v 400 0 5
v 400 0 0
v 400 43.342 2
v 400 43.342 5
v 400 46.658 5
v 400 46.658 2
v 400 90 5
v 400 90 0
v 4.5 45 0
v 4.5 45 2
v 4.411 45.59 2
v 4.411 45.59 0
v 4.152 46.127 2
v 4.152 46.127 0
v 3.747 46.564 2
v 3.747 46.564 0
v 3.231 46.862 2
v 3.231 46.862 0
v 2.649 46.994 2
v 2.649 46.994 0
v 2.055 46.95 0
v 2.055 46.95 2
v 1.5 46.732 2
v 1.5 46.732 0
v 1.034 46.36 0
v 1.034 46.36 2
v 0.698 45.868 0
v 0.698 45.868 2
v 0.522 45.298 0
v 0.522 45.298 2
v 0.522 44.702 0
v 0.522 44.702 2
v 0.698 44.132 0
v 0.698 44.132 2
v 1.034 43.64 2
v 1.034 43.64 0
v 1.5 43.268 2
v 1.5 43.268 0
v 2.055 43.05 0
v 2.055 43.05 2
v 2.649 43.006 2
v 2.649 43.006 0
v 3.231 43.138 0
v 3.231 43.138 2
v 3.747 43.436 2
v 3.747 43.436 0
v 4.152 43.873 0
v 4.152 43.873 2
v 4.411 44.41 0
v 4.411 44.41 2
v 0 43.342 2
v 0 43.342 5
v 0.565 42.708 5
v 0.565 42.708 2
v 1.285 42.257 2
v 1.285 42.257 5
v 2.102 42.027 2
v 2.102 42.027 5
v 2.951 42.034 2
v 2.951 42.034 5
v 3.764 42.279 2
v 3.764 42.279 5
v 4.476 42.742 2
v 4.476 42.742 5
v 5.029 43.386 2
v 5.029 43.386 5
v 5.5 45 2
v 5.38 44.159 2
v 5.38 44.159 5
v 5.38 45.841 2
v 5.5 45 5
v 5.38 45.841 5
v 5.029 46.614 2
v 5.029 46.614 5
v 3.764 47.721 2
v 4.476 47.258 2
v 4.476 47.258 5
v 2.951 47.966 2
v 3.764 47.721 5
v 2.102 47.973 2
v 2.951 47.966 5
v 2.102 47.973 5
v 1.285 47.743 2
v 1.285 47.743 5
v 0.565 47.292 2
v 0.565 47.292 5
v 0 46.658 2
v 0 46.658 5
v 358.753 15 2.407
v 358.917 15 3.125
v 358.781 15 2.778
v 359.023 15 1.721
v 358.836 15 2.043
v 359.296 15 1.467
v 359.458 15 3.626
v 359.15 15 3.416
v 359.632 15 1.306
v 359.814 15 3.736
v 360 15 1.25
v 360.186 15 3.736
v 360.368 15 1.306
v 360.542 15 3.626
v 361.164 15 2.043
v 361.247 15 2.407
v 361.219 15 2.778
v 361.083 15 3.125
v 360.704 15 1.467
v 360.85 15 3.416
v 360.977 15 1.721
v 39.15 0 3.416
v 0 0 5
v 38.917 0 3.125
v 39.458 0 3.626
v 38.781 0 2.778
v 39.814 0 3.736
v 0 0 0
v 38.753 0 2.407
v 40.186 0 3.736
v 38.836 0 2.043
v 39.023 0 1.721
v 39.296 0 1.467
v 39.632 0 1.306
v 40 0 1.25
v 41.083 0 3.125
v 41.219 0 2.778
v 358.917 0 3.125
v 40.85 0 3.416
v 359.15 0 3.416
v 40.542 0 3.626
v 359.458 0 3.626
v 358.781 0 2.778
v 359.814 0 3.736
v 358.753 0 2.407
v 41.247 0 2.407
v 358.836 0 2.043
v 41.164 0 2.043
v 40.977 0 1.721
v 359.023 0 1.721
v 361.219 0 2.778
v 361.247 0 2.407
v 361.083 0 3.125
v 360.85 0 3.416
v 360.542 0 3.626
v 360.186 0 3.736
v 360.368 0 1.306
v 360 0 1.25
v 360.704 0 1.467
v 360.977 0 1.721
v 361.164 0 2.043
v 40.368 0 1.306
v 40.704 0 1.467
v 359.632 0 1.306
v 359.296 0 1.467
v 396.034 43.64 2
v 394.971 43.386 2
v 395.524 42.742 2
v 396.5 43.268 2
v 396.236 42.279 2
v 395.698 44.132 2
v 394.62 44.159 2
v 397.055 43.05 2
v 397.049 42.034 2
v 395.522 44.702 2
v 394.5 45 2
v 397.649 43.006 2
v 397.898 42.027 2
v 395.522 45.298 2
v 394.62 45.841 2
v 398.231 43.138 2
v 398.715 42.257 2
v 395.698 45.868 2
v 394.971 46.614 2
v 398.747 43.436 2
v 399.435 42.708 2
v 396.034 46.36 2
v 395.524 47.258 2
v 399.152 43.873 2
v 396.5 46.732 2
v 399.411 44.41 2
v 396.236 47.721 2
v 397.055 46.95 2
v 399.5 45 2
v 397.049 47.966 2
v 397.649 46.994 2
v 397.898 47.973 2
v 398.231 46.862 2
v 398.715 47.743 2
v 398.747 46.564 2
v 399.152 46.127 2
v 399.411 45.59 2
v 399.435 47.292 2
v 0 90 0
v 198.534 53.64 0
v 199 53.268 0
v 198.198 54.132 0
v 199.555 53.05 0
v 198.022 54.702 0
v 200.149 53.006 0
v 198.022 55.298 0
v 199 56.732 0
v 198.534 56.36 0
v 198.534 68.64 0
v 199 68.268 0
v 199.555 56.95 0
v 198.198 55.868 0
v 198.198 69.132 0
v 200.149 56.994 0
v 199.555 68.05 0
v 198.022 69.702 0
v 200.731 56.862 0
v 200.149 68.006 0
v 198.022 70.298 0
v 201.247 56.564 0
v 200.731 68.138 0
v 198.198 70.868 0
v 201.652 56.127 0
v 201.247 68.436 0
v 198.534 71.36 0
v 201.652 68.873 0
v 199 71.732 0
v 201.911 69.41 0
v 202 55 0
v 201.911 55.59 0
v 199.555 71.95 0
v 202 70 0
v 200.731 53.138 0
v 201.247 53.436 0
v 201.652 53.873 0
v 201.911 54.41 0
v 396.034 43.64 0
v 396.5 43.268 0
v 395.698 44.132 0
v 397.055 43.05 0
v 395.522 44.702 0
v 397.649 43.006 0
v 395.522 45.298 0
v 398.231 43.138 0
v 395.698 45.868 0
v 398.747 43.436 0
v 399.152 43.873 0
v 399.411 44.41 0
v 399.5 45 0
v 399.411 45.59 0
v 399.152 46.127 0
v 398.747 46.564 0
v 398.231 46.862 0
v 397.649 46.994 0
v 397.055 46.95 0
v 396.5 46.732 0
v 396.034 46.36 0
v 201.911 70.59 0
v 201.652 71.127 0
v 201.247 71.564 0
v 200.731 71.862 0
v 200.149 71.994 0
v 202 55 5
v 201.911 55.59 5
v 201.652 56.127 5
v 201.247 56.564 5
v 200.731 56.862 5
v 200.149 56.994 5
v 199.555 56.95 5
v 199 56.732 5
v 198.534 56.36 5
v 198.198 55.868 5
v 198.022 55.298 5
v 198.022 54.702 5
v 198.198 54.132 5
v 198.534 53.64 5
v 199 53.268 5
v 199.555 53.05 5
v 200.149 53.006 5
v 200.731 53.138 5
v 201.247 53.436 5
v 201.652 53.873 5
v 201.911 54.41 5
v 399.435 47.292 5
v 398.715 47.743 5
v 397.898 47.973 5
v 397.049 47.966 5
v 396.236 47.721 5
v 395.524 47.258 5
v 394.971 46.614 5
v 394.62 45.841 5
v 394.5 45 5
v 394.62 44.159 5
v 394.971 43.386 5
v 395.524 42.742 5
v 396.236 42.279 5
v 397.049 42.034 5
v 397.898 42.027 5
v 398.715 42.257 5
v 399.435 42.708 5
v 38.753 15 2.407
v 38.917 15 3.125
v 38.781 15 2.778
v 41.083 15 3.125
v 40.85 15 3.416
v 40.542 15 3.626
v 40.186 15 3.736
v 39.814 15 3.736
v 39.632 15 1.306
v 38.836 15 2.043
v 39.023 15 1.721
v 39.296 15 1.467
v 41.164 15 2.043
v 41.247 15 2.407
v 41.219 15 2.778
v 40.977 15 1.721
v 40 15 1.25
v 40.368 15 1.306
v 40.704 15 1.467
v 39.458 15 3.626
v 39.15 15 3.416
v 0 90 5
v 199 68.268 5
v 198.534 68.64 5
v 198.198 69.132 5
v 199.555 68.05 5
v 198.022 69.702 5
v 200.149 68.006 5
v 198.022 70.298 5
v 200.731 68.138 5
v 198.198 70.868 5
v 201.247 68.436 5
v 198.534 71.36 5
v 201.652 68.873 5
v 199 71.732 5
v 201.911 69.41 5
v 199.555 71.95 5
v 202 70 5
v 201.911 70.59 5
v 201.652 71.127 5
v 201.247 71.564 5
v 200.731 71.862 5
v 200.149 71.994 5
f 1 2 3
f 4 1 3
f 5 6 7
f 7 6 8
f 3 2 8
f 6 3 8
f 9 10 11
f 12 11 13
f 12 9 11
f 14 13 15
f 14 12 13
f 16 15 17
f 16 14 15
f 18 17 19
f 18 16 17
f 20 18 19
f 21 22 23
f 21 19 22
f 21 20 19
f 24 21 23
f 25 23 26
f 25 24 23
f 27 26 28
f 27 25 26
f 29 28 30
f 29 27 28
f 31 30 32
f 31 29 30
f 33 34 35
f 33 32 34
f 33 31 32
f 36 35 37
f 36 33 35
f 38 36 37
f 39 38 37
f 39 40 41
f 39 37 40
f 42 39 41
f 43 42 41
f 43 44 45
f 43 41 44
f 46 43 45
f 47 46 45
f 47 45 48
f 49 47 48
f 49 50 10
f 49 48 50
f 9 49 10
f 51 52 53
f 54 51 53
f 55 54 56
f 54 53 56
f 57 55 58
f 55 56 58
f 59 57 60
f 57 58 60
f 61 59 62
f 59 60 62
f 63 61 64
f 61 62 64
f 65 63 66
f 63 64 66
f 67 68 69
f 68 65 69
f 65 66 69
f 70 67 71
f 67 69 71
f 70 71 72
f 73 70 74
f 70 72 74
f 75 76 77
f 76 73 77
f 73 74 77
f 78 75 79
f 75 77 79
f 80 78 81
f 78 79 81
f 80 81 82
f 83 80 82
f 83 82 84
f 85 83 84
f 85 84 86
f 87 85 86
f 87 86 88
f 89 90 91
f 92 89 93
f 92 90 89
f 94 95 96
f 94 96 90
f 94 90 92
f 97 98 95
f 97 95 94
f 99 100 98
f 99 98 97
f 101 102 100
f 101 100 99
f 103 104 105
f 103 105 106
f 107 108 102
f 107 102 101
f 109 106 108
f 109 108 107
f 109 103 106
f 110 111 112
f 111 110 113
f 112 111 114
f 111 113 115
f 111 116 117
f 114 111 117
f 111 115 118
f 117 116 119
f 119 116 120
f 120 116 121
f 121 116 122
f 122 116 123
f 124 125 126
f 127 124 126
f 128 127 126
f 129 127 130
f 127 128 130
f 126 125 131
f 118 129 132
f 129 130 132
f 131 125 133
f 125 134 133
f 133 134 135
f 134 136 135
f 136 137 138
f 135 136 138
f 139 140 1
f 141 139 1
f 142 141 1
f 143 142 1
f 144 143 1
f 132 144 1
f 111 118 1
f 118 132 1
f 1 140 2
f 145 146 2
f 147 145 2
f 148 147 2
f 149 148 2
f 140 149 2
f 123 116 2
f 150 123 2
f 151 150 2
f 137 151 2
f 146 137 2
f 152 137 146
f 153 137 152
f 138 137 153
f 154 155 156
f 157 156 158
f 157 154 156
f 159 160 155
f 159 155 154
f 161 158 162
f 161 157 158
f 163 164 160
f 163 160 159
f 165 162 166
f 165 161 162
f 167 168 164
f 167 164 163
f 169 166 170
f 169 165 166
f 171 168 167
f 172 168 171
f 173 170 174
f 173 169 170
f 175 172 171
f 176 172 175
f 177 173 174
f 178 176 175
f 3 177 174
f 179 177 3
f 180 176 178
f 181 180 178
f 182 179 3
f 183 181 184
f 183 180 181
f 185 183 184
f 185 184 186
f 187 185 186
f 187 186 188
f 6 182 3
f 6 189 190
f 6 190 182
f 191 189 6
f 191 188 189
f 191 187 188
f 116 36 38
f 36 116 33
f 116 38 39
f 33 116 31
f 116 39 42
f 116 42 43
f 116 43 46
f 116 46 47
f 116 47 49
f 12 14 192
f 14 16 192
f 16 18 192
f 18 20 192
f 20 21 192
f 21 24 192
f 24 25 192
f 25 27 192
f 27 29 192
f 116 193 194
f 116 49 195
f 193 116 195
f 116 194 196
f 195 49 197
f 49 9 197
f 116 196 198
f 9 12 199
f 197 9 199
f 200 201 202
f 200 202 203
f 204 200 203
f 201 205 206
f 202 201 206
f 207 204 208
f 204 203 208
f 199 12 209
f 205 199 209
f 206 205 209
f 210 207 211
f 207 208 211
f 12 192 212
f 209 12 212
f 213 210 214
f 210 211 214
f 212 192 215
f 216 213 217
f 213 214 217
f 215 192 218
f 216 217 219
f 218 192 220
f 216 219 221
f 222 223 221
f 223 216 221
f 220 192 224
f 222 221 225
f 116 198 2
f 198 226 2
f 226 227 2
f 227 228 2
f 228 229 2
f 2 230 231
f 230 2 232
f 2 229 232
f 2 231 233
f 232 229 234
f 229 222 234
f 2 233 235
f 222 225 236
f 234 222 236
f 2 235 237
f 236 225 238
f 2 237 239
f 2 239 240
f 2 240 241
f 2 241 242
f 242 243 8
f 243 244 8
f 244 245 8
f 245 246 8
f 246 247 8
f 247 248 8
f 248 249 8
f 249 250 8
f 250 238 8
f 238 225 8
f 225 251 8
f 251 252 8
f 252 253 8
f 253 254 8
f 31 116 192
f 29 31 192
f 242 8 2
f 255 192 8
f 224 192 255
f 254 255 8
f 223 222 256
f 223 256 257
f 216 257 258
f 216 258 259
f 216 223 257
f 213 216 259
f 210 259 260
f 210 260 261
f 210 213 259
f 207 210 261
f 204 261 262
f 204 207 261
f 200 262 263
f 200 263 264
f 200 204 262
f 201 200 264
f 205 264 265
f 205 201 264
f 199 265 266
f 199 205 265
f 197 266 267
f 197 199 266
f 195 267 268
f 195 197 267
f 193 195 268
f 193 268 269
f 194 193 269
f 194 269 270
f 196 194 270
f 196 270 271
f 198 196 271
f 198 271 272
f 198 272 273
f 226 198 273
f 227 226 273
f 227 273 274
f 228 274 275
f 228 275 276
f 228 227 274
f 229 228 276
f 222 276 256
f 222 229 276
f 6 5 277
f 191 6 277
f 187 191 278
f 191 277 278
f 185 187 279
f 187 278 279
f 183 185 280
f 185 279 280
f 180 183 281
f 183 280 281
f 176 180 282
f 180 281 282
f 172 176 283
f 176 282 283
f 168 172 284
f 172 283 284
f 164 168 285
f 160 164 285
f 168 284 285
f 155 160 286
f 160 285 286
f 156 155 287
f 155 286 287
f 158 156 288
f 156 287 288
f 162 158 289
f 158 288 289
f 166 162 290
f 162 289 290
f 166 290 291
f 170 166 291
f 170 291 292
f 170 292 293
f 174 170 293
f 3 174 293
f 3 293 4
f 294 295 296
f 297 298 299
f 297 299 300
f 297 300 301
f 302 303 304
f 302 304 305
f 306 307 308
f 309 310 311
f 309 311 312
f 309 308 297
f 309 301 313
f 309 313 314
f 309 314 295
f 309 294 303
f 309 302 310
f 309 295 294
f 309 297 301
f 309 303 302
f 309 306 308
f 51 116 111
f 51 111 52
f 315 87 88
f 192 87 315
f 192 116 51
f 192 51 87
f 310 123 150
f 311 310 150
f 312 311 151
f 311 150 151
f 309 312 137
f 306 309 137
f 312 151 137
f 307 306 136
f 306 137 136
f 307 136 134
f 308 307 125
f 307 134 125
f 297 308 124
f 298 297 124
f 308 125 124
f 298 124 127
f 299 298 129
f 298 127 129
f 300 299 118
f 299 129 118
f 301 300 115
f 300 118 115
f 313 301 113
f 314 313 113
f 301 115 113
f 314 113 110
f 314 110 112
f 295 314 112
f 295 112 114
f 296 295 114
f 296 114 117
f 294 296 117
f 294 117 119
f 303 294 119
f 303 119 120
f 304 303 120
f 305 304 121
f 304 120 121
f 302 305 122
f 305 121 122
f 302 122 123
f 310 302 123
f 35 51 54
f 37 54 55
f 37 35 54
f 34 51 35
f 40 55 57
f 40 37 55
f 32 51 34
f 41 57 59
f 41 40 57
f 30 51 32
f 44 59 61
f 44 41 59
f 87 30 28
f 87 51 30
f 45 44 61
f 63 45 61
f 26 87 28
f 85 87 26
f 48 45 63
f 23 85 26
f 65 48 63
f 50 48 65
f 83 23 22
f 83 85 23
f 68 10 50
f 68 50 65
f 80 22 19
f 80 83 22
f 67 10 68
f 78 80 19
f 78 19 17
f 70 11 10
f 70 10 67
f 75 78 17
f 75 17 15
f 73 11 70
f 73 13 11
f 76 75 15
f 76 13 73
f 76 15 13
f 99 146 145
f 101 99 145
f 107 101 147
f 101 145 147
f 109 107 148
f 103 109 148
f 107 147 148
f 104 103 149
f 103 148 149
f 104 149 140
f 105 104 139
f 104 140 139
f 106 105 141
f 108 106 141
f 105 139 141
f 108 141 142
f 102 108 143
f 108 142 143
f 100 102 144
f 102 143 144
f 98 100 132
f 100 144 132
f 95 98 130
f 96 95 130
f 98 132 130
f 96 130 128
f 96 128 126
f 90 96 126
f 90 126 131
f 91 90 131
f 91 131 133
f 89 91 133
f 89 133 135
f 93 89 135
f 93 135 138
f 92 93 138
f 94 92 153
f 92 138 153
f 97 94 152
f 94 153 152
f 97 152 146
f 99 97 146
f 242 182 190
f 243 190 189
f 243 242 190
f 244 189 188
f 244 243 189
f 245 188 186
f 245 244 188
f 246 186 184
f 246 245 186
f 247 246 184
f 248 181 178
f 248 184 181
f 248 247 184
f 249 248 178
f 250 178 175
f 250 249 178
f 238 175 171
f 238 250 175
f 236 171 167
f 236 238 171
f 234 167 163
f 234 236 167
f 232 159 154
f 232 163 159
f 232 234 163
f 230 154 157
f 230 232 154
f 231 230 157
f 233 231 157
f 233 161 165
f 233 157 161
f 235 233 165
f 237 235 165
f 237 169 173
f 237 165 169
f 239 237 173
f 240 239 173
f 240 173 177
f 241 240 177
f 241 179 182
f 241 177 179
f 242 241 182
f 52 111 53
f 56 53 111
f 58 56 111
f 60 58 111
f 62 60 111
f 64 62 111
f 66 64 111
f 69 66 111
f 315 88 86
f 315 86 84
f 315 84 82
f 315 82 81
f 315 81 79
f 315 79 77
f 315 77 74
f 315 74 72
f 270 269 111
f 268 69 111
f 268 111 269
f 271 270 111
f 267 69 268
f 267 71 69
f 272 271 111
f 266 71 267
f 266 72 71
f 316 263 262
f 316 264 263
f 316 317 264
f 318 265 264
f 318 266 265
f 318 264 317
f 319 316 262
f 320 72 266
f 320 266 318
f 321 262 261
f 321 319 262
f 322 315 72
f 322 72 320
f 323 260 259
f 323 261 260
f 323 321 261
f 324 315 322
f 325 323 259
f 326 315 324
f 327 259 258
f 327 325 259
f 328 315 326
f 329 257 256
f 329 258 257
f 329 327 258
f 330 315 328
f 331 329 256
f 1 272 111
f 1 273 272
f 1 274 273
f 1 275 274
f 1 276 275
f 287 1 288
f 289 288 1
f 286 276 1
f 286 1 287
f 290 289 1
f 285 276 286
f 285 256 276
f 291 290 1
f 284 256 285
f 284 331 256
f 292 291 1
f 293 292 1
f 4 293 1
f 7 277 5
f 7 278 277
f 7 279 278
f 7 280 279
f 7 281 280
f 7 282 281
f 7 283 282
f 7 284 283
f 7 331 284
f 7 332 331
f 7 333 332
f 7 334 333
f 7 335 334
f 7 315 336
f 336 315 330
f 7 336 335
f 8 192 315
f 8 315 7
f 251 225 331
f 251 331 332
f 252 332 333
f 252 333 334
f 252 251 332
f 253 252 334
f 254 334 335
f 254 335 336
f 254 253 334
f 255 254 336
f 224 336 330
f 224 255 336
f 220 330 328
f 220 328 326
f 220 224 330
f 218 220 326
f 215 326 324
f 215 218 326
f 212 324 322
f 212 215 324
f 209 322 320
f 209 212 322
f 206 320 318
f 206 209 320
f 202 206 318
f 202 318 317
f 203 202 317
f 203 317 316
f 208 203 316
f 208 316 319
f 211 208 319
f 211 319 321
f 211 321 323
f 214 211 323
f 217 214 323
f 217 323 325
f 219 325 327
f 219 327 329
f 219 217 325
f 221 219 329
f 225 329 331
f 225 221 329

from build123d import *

# Parameters (mm, degrees)
SKETCH1_W           = 400
SKETCH1_H           = 90
SKETCH1_R           = 2
BOSS_EXTRUDE2_DEPTH = 5
SKETCH2_R           = 3
CUT_EXTRUDE1_DEPTH  = 3
SKETCH3_R           = 1.25
CUT_EXTRUDE2_DEPTH  = 15


with BuildPart() as part:
    # Sketch1 → Boss-Extrude2 (new body)
    with BuildSketch(Plane.XY):
        with Locations((200, 45)):
            Rectangle(SKETCH1_W, SKETCH1_H)
        with Locations((2.5, 45)):
            Circle(SKETCH1_R, mode=Mode.SUBTRACT)
        with Locations((397.5, 45)):
            Circle(SKETCH1_R, mode=Mode.SUBTRACT)
        with Locations((200, 55)):
            Circle(SKETCH1_R, mode=Mode.SUBTRACT)
        with Locations((200, 70)):
            Circle(SKETCH1_R, mode=Mode.SUBTRACT)
    extrude(amount=BOSS_EXTRUDE2_DEPTH)

    # Sketch2 → Cut-Extrude1 (cut)
    with BuildSketch(Plane.XY.offset(5)):
        with Locations((2.5, 45)):
            Circle(SKETCH2_R)
        with Locations((397.5, 45)):
            Circle(SKETCH2_R)
    extrude(amount=-CUT_EXTRUDE1_DEPTH, mode=Mode.SUBTRACT)

    # Sketch3 → Cut-Extrude2 (cut)
    with BuildSketch(Plane.XZ):
        with Locations(Location((40, 2.5, 0), (0, 0, 270))):
            Circle(SKETCH3_R)
        with Locations(Location((360, 2.5, 0), (0, 0, 270))):
            Circle(SKETCH3_R)
    extrude(amount=-CUT_EXTRUDE2_DEPTH, mode=Mode.SUBTRACT)


solid = part.part
